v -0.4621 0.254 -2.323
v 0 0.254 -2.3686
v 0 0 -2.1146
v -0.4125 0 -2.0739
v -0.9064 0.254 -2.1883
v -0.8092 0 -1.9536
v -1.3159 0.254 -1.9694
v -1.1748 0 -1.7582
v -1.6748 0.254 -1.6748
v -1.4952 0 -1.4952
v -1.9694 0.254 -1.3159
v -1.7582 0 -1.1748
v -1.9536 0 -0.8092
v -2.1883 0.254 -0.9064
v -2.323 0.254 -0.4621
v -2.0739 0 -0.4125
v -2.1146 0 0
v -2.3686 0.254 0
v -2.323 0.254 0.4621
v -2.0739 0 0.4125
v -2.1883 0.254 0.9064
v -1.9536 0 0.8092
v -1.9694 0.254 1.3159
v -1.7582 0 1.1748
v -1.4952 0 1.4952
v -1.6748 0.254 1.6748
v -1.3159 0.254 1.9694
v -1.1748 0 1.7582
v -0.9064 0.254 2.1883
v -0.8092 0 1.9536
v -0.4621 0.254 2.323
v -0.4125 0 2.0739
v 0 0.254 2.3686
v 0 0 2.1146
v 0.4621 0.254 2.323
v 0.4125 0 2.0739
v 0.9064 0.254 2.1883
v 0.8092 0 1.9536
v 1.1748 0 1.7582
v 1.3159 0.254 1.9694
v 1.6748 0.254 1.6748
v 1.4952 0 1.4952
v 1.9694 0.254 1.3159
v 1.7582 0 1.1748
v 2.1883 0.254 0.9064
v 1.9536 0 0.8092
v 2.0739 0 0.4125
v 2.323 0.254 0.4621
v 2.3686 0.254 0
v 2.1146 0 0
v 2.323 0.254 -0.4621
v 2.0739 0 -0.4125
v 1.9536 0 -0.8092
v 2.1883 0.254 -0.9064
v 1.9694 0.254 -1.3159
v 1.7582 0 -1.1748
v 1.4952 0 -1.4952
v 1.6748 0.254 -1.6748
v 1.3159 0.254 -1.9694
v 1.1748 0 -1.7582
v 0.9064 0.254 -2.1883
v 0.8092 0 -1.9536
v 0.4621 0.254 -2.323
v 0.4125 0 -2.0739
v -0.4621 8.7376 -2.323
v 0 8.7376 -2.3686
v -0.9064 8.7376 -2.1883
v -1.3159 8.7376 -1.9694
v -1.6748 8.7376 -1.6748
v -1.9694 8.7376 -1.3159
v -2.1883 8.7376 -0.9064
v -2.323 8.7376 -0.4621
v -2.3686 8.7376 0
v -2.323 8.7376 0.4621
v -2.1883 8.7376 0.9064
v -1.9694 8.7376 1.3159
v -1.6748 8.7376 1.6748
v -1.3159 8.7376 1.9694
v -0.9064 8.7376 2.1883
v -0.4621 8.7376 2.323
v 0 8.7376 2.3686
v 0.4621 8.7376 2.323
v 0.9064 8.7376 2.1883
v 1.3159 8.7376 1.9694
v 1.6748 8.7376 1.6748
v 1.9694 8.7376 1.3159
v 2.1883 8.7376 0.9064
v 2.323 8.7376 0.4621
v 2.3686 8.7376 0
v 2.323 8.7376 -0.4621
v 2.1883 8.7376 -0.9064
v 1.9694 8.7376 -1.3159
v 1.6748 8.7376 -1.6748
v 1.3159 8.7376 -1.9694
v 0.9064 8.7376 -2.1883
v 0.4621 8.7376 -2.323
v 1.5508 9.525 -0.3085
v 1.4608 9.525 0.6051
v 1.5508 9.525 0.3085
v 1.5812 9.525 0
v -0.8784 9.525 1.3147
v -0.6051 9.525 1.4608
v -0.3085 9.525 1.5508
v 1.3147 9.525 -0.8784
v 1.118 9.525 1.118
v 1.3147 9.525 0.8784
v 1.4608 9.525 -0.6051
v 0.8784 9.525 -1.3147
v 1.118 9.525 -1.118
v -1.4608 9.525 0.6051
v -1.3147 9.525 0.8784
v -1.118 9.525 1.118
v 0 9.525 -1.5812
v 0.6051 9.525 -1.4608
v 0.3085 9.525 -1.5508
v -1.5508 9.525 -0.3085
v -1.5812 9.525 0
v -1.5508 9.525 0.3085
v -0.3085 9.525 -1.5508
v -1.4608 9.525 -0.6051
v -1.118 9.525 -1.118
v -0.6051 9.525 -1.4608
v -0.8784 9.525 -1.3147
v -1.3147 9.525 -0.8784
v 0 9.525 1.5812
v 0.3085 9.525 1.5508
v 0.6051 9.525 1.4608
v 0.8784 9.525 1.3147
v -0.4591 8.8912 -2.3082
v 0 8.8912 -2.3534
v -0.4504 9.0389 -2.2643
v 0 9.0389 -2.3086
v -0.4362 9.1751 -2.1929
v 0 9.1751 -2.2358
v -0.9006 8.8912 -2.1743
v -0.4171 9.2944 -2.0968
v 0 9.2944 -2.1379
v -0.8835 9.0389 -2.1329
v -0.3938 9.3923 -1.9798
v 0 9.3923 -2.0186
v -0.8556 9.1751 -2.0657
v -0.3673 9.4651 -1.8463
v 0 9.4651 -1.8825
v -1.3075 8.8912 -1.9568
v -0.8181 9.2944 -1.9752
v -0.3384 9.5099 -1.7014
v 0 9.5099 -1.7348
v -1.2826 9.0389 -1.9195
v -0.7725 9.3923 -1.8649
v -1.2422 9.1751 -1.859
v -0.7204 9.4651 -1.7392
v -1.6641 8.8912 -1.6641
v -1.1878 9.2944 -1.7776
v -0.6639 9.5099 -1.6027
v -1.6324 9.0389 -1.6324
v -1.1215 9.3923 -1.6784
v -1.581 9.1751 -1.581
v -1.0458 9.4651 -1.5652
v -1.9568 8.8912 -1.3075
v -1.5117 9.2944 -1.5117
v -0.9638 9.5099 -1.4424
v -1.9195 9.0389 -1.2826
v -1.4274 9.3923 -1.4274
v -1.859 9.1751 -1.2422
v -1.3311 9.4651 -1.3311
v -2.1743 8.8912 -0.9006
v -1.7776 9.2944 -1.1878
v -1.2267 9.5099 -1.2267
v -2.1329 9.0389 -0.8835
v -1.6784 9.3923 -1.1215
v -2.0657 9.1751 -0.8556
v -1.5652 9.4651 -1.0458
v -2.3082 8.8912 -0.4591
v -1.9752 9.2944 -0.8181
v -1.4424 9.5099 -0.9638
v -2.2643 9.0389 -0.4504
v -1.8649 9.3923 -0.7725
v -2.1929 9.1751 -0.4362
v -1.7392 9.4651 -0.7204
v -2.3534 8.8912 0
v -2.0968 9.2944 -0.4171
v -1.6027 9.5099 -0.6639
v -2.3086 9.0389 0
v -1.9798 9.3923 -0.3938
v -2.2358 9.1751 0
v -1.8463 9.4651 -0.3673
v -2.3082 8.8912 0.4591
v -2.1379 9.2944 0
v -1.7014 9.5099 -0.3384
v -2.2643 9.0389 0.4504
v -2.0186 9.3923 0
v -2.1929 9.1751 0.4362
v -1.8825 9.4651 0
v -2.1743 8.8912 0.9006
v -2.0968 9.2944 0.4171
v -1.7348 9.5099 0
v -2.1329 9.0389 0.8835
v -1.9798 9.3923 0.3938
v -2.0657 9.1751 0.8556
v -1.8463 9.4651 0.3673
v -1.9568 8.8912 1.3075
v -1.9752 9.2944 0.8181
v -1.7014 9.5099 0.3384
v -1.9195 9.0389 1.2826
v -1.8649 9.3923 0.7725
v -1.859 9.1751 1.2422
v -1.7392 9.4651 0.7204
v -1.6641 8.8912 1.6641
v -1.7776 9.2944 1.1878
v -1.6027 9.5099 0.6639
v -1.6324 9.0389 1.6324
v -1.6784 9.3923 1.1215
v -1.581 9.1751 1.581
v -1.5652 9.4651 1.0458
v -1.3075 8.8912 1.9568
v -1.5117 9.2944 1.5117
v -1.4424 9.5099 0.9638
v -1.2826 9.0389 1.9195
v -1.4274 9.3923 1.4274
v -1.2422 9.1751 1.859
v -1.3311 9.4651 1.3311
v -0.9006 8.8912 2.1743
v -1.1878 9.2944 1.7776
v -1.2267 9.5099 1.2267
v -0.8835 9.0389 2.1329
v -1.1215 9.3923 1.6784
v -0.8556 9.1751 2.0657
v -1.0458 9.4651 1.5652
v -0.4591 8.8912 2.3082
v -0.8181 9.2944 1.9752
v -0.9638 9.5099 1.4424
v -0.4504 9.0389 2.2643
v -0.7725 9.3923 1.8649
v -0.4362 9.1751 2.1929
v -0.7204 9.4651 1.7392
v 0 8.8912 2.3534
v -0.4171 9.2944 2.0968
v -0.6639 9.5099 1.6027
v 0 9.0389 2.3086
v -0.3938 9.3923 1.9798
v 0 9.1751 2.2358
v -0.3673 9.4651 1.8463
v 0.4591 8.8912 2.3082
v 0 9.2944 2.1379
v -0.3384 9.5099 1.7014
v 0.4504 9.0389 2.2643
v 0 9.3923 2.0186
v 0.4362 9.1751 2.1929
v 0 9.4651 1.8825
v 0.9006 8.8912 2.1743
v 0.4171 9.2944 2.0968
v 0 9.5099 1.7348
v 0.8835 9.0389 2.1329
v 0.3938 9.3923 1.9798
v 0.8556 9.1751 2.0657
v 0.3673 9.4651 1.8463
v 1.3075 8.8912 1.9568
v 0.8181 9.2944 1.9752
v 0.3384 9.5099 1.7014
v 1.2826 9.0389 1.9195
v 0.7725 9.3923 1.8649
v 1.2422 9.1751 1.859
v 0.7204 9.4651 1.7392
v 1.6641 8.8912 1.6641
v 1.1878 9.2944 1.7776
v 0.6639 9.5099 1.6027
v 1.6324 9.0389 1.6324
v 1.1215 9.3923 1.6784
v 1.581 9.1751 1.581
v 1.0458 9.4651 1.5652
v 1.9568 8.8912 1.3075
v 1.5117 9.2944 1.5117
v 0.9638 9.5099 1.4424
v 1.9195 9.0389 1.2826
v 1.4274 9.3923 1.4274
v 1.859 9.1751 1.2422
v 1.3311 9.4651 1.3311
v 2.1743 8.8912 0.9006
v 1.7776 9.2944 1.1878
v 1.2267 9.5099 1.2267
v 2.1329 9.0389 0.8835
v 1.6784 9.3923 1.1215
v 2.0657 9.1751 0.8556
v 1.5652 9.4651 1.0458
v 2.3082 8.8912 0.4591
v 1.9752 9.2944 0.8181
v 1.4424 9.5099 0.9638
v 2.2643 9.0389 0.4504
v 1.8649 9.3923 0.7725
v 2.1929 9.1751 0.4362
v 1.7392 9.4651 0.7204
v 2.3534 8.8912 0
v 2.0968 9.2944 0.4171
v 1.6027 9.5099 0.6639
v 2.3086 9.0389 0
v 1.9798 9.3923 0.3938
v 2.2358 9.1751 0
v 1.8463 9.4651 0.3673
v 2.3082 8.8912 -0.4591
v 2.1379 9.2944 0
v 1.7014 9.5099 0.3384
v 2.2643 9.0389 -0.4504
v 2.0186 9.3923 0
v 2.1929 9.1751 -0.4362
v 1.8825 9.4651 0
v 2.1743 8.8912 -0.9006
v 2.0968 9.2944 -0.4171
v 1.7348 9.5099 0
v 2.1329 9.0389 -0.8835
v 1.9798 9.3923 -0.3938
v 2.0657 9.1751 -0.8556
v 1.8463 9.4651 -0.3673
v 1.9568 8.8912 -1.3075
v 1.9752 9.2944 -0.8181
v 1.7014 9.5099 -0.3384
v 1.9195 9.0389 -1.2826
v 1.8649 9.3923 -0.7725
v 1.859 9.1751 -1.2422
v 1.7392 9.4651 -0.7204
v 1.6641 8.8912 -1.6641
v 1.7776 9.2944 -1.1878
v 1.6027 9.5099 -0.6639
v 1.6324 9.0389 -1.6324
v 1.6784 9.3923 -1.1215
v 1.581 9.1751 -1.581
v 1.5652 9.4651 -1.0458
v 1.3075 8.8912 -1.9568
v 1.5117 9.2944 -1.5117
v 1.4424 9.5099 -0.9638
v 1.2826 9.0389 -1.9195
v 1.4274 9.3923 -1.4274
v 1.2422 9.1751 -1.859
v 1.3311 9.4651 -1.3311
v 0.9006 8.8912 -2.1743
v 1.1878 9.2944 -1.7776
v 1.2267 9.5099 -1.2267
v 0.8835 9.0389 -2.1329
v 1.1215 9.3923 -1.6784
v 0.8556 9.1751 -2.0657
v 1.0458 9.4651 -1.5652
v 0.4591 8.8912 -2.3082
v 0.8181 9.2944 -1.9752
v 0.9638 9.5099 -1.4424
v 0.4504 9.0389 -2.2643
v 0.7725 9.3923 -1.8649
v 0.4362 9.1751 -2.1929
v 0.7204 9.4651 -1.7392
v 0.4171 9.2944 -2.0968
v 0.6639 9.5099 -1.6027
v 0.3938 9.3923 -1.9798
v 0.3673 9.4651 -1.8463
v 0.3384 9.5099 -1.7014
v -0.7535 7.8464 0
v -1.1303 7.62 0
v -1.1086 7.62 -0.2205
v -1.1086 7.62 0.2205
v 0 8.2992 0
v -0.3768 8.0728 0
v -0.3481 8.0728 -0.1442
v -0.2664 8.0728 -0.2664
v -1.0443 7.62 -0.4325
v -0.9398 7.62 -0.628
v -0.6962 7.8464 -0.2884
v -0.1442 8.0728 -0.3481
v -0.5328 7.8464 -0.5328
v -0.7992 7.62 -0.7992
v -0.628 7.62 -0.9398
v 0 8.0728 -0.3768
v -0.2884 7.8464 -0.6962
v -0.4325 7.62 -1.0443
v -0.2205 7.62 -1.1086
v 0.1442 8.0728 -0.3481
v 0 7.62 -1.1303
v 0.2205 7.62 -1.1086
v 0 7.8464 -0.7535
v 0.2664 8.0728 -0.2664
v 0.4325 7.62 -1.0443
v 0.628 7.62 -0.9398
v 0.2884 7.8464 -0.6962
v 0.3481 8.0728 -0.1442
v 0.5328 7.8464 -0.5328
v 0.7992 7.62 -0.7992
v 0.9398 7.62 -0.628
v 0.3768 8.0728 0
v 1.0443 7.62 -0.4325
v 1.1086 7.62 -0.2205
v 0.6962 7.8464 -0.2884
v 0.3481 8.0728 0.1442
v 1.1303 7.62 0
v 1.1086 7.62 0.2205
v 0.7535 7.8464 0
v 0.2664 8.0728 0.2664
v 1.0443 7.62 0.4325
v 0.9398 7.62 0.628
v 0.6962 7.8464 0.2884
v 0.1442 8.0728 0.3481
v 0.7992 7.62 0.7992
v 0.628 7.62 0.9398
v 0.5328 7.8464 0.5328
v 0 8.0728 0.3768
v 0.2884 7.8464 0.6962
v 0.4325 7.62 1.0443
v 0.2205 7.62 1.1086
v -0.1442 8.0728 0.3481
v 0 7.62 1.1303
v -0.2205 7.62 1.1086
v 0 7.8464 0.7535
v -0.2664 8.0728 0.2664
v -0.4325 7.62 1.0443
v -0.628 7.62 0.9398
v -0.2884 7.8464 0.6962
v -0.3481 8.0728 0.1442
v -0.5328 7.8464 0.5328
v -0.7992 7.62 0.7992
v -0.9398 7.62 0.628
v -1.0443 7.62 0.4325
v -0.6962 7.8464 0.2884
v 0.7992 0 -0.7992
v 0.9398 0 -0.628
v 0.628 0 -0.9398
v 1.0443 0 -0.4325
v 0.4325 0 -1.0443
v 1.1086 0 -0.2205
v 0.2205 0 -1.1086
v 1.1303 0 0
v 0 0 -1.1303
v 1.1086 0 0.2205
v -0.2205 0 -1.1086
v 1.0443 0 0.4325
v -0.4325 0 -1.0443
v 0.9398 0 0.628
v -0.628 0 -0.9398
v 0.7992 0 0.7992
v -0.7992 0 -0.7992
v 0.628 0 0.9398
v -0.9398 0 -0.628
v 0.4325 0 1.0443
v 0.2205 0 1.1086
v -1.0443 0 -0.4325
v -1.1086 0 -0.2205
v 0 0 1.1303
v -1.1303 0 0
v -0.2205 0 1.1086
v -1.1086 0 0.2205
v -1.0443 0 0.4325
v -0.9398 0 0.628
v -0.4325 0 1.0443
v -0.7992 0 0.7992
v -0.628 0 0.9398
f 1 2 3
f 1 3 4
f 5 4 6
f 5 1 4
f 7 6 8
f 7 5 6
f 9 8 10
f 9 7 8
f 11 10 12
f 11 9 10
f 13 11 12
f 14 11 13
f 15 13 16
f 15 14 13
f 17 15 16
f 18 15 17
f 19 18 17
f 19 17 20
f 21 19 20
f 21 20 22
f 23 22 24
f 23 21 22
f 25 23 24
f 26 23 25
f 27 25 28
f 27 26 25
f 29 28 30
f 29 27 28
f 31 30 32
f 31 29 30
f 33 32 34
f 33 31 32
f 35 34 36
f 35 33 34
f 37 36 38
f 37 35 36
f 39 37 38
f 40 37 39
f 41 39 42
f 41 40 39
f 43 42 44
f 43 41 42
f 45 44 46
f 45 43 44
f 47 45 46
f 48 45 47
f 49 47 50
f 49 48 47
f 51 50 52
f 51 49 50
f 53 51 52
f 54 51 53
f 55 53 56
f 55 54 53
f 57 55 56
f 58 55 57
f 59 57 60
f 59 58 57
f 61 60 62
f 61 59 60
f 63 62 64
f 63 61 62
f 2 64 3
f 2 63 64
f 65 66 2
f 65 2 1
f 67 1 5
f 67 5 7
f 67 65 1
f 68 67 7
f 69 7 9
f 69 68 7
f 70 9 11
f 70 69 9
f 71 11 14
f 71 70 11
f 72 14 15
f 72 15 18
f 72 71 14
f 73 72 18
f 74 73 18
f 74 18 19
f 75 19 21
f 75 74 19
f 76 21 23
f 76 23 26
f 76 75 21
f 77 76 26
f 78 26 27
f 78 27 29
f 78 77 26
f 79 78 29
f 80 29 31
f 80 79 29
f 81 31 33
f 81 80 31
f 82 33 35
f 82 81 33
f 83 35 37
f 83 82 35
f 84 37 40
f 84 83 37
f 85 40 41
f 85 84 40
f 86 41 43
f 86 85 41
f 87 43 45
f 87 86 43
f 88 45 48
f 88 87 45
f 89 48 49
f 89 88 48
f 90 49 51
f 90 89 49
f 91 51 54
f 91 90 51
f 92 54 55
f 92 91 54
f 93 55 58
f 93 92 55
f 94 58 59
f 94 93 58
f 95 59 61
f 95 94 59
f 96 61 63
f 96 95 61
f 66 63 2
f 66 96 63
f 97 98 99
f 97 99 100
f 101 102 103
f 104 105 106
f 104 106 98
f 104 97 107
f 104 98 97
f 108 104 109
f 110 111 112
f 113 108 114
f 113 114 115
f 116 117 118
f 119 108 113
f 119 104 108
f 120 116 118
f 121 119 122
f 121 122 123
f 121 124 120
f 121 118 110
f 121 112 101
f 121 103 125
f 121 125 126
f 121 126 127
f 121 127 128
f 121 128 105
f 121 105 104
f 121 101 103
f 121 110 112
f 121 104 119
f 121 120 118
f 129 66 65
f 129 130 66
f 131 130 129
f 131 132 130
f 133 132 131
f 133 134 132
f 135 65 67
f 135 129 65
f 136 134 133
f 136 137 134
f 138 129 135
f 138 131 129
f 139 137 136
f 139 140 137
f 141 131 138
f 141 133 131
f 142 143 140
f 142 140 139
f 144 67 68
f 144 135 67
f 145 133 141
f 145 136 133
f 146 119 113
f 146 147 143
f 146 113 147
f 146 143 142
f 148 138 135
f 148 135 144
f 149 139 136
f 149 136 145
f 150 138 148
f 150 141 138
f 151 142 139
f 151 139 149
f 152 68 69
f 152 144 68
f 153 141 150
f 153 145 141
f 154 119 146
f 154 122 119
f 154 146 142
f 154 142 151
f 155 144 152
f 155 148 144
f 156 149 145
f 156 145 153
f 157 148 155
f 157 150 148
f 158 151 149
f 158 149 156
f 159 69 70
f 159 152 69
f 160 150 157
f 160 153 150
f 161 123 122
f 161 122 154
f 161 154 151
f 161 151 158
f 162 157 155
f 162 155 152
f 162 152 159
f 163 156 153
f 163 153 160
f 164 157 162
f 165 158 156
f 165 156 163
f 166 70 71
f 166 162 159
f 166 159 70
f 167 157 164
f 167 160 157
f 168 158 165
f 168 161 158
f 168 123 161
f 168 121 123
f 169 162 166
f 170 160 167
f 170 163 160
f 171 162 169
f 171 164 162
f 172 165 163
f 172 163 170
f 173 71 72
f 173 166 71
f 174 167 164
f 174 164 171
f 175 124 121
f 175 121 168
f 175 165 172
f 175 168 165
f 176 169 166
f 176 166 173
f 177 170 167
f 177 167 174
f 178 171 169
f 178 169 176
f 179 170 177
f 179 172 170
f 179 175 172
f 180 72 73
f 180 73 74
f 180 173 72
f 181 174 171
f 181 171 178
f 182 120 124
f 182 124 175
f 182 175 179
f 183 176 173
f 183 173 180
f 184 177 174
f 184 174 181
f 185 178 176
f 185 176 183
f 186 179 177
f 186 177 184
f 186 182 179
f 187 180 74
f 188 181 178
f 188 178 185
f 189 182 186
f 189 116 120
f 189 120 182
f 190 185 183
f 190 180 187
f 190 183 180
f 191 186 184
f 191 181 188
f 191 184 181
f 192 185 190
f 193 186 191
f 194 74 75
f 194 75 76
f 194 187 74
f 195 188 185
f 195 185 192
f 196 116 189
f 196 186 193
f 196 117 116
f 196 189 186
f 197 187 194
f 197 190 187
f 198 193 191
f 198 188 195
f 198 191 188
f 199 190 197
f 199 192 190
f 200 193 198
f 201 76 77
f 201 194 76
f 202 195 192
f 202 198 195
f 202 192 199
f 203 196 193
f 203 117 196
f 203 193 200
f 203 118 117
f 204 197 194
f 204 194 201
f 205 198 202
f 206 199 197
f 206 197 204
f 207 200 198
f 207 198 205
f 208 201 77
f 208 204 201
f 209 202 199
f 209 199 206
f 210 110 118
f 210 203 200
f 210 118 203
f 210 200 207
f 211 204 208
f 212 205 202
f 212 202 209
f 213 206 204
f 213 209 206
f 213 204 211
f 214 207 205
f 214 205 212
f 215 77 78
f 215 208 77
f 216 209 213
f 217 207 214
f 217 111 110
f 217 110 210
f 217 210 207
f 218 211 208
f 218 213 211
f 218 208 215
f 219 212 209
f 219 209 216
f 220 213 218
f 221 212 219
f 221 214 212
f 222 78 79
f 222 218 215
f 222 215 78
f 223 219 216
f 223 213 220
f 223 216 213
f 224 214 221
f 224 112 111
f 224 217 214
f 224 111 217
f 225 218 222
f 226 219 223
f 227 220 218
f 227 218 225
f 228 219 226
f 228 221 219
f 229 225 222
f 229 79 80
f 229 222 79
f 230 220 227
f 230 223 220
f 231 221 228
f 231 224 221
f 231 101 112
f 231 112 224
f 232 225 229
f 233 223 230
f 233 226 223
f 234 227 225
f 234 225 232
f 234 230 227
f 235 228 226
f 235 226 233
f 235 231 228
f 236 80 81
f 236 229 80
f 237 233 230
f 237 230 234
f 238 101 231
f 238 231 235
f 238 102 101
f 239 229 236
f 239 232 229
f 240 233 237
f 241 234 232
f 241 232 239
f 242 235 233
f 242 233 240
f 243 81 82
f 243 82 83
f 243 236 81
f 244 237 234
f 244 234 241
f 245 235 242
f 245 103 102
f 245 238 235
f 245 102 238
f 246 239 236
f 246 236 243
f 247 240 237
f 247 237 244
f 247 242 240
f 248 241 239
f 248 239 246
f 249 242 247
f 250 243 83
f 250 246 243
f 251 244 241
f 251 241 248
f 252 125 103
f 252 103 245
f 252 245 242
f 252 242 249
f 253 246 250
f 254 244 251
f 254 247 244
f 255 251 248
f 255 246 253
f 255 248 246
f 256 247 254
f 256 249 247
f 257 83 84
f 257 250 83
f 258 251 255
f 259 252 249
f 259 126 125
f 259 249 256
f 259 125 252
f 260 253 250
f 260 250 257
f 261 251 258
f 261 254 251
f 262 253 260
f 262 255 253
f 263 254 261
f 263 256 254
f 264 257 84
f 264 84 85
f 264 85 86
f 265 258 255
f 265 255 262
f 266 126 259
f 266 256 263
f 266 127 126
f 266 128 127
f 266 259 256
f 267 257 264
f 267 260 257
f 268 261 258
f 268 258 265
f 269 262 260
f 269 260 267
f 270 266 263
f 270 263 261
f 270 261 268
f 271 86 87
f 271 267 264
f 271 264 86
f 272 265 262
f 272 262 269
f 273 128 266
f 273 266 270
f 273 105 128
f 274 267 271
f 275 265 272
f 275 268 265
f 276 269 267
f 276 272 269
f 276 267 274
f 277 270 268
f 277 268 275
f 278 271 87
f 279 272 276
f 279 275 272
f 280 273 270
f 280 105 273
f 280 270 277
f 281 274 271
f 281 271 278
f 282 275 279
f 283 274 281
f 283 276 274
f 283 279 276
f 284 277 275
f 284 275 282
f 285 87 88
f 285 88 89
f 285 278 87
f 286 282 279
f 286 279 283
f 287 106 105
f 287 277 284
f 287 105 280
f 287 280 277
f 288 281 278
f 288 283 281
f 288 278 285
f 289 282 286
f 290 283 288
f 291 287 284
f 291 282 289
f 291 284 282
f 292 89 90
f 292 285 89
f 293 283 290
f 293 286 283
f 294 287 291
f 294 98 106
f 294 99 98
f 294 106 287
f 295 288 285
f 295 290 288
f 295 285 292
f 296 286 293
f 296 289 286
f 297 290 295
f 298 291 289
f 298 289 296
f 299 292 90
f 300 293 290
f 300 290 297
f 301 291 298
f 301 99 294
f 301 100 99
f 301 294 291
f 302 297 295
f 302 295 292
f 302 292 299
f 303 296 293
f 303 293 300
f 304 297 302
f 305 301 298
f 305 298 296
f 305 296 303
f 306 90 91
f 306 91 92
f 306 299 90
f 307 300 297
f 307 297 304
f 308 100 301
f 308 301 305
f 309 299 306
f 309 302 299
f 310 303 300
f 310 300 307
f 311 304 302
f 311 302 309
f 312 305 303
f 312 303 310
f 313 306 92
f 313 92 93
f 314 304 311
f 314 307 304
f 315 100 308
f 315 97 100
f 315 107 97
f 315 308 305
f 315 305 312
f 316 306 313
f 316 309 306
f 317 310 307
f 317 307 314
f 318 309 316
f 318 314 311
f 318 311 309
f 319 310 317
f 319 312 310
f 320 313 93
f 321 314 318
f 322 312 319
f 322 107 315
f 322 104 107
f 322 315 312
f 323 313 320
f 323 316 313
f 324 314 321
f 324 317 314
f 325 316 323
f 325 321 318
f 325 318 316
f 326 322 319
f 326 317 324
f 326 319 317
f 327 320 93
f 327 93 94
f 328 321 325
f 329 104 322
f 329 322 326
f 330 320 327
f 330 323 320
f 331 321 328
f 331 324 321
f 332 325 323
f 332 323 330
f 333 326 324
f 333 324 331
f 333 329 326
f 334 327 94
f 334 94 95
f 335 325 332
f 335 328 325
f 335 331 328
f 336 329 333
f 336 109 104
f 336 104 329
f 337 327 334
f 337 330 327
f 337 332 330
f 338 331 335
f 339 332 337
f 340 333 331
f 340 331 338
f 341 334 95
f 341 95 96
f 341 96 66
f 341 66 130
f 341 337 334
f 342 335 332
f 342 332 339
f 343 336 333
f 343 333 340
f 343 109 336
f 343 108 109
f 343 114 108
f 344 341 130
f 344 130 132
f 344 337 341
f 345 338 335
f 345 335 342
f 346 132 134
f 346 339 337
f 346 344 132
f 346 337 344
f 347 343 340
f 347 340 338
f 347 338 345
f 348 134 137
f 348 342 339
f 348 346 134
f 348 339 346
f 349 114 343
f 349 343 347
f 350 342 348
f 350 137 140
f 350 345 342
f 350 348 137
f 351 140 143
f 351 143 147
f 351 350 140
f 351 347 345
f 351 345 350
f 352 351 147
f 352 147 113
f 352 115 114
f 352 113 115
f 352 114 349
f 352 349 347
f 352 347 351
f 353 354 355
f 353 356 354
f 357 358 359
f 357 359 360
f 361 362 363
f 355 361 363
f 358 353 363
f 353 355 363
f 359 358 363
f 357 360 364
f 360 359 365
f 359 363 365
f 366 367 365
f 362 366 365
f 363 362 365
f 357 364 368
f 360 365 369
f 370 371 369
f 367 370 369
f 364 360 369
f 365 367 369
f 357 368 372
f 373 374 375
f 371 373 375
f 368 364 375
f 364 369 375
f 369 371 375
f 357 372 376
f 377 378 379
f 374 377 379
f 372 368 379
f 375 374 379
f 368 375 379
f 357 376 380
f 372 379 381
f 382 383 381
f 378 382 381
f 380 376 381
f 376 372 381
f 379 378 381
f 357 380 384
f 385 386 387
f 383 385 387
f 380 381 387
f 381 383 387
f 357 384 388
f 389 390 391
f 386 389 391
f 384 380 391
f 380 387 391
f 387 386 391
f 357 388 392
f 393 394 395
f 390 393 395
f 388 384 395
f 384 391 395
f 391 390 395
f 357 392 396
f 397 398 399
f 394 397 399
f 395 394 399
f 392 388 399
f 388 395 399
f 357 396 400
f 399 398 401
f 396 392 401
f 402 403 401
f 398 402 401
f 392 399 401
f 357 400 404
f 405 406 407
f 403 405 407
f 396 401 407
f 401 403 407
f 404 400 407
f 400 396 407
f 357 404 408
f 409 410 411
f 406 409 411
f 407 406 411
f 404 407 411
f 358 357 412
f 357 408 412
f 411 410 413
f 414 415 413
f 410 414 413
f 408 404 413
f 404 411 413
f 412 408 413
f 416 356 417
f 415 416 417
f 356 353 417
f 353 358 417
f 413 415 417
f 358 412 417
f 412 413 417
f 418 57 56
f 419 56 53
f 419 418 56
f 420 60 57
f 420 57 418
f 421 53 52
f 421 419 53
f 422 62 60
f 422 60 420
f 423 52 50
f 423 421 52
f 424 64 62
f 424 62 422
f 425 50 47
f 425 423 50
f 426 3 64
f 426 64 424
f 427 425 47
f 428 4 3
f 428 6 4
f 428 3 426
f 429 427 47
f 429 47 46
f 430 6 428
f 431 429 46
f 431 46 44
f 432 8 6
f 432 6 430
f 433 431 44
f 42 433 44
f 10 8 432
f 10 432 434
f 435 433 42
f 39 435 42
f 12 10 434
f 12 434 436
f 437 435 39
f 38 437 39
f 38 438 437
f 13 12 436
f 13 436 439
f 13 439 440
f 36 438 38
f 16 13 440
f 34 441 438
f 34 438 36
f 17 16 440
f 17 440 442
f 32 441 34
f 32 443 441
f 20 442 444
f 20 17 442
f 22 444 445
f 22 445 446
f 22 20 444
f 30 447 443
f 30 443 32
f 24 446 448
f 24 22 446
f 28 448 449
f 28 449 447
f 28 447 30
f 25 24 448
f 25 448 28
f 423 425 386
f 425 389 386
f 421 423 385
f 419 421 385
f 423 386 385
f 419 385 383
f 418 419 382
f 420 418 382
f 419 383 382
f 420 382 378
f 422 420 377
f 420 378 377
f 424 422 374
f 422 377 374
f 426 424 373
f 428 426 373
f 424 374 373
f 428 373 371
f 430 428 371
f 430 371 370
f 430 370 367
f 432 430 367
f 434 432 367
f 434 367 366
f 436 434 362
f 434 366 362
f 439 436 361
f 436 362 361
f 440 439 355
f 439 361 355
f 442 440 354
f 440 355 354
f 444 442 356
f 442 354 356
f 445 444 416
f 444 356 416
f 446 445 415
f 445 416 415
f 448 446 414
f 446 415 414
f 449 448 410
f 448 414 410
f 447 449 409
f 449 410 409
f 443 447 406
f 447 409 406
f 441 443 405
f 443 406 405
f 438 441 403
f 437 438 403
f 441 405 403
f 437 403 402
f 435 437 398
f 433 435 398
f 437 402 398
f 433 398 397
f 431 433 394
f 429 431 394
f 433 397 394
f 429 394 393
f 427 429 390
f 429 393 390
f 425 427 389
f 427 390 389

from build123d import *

# Parameters (mm, degrees)
CHAMFER1_SIZE             = 0.254
F_4_40_TAPPED_HOLE1_D     = 2.2606
F_4_40_TAPPED_HOLE1_DEPTH = 7.62
F_4_40_TAPPED_HOLE1_TIP   = 0.679152758


with BuildPart() as part:
    # Sketch1 → Revolve1 (revolve)
    with BuildSketch(Plane.XY):
        with BuildLine():
            Line((0, 0), (-2.36855, 0))
            Line((-2.36855, 0), (-2.36855, 8.7376))
            ThreePointArc((-2.36855, 8.7376), (-2.13792588, 9.29437588), (-1.58115, 9.525))
            Line((-1.58115, 9.525), (0, 9.525))
            Line((0, 9.525), (0, 0))
        make_face()
    revolve(axis=Axis((0, 0, 0), (0, 1, 0)))

    # Chamfer1
    chamfer1_edges = [part.edges().sort_by_distance(p)[0] for p in [
        (2.36855, 0, 0),
    ]]
    chamfer(chamfer1_edges, length=CHAMFER1_SIZE)

    # #4-40 Tapped Hole1
    with Locations(Plane(origin=(0, 0, 0), x_dir=(-1, 0, 0), z_dir=(0, -1, 0))):
        with Locations((0, 0)):
            Hole(F_4_40_TAPPED_HOLE1_D / 2, depth=F_4_40_TAPPED_HOLE1_DEPTH)
            with Locations((0, 0, -(F_4_40_TAPPED_HOLE1_DEPTH + F_4_40_TAPPED_HOLE1_TIP / 2))):  # 118° drill point
                Cone(0, F_4_40_TAPPED_HOLE1_D / 2, F_4_40_TAPPED_HOLE1_TIP, mode=Mode.SUBTRACT)


solid = part.part
